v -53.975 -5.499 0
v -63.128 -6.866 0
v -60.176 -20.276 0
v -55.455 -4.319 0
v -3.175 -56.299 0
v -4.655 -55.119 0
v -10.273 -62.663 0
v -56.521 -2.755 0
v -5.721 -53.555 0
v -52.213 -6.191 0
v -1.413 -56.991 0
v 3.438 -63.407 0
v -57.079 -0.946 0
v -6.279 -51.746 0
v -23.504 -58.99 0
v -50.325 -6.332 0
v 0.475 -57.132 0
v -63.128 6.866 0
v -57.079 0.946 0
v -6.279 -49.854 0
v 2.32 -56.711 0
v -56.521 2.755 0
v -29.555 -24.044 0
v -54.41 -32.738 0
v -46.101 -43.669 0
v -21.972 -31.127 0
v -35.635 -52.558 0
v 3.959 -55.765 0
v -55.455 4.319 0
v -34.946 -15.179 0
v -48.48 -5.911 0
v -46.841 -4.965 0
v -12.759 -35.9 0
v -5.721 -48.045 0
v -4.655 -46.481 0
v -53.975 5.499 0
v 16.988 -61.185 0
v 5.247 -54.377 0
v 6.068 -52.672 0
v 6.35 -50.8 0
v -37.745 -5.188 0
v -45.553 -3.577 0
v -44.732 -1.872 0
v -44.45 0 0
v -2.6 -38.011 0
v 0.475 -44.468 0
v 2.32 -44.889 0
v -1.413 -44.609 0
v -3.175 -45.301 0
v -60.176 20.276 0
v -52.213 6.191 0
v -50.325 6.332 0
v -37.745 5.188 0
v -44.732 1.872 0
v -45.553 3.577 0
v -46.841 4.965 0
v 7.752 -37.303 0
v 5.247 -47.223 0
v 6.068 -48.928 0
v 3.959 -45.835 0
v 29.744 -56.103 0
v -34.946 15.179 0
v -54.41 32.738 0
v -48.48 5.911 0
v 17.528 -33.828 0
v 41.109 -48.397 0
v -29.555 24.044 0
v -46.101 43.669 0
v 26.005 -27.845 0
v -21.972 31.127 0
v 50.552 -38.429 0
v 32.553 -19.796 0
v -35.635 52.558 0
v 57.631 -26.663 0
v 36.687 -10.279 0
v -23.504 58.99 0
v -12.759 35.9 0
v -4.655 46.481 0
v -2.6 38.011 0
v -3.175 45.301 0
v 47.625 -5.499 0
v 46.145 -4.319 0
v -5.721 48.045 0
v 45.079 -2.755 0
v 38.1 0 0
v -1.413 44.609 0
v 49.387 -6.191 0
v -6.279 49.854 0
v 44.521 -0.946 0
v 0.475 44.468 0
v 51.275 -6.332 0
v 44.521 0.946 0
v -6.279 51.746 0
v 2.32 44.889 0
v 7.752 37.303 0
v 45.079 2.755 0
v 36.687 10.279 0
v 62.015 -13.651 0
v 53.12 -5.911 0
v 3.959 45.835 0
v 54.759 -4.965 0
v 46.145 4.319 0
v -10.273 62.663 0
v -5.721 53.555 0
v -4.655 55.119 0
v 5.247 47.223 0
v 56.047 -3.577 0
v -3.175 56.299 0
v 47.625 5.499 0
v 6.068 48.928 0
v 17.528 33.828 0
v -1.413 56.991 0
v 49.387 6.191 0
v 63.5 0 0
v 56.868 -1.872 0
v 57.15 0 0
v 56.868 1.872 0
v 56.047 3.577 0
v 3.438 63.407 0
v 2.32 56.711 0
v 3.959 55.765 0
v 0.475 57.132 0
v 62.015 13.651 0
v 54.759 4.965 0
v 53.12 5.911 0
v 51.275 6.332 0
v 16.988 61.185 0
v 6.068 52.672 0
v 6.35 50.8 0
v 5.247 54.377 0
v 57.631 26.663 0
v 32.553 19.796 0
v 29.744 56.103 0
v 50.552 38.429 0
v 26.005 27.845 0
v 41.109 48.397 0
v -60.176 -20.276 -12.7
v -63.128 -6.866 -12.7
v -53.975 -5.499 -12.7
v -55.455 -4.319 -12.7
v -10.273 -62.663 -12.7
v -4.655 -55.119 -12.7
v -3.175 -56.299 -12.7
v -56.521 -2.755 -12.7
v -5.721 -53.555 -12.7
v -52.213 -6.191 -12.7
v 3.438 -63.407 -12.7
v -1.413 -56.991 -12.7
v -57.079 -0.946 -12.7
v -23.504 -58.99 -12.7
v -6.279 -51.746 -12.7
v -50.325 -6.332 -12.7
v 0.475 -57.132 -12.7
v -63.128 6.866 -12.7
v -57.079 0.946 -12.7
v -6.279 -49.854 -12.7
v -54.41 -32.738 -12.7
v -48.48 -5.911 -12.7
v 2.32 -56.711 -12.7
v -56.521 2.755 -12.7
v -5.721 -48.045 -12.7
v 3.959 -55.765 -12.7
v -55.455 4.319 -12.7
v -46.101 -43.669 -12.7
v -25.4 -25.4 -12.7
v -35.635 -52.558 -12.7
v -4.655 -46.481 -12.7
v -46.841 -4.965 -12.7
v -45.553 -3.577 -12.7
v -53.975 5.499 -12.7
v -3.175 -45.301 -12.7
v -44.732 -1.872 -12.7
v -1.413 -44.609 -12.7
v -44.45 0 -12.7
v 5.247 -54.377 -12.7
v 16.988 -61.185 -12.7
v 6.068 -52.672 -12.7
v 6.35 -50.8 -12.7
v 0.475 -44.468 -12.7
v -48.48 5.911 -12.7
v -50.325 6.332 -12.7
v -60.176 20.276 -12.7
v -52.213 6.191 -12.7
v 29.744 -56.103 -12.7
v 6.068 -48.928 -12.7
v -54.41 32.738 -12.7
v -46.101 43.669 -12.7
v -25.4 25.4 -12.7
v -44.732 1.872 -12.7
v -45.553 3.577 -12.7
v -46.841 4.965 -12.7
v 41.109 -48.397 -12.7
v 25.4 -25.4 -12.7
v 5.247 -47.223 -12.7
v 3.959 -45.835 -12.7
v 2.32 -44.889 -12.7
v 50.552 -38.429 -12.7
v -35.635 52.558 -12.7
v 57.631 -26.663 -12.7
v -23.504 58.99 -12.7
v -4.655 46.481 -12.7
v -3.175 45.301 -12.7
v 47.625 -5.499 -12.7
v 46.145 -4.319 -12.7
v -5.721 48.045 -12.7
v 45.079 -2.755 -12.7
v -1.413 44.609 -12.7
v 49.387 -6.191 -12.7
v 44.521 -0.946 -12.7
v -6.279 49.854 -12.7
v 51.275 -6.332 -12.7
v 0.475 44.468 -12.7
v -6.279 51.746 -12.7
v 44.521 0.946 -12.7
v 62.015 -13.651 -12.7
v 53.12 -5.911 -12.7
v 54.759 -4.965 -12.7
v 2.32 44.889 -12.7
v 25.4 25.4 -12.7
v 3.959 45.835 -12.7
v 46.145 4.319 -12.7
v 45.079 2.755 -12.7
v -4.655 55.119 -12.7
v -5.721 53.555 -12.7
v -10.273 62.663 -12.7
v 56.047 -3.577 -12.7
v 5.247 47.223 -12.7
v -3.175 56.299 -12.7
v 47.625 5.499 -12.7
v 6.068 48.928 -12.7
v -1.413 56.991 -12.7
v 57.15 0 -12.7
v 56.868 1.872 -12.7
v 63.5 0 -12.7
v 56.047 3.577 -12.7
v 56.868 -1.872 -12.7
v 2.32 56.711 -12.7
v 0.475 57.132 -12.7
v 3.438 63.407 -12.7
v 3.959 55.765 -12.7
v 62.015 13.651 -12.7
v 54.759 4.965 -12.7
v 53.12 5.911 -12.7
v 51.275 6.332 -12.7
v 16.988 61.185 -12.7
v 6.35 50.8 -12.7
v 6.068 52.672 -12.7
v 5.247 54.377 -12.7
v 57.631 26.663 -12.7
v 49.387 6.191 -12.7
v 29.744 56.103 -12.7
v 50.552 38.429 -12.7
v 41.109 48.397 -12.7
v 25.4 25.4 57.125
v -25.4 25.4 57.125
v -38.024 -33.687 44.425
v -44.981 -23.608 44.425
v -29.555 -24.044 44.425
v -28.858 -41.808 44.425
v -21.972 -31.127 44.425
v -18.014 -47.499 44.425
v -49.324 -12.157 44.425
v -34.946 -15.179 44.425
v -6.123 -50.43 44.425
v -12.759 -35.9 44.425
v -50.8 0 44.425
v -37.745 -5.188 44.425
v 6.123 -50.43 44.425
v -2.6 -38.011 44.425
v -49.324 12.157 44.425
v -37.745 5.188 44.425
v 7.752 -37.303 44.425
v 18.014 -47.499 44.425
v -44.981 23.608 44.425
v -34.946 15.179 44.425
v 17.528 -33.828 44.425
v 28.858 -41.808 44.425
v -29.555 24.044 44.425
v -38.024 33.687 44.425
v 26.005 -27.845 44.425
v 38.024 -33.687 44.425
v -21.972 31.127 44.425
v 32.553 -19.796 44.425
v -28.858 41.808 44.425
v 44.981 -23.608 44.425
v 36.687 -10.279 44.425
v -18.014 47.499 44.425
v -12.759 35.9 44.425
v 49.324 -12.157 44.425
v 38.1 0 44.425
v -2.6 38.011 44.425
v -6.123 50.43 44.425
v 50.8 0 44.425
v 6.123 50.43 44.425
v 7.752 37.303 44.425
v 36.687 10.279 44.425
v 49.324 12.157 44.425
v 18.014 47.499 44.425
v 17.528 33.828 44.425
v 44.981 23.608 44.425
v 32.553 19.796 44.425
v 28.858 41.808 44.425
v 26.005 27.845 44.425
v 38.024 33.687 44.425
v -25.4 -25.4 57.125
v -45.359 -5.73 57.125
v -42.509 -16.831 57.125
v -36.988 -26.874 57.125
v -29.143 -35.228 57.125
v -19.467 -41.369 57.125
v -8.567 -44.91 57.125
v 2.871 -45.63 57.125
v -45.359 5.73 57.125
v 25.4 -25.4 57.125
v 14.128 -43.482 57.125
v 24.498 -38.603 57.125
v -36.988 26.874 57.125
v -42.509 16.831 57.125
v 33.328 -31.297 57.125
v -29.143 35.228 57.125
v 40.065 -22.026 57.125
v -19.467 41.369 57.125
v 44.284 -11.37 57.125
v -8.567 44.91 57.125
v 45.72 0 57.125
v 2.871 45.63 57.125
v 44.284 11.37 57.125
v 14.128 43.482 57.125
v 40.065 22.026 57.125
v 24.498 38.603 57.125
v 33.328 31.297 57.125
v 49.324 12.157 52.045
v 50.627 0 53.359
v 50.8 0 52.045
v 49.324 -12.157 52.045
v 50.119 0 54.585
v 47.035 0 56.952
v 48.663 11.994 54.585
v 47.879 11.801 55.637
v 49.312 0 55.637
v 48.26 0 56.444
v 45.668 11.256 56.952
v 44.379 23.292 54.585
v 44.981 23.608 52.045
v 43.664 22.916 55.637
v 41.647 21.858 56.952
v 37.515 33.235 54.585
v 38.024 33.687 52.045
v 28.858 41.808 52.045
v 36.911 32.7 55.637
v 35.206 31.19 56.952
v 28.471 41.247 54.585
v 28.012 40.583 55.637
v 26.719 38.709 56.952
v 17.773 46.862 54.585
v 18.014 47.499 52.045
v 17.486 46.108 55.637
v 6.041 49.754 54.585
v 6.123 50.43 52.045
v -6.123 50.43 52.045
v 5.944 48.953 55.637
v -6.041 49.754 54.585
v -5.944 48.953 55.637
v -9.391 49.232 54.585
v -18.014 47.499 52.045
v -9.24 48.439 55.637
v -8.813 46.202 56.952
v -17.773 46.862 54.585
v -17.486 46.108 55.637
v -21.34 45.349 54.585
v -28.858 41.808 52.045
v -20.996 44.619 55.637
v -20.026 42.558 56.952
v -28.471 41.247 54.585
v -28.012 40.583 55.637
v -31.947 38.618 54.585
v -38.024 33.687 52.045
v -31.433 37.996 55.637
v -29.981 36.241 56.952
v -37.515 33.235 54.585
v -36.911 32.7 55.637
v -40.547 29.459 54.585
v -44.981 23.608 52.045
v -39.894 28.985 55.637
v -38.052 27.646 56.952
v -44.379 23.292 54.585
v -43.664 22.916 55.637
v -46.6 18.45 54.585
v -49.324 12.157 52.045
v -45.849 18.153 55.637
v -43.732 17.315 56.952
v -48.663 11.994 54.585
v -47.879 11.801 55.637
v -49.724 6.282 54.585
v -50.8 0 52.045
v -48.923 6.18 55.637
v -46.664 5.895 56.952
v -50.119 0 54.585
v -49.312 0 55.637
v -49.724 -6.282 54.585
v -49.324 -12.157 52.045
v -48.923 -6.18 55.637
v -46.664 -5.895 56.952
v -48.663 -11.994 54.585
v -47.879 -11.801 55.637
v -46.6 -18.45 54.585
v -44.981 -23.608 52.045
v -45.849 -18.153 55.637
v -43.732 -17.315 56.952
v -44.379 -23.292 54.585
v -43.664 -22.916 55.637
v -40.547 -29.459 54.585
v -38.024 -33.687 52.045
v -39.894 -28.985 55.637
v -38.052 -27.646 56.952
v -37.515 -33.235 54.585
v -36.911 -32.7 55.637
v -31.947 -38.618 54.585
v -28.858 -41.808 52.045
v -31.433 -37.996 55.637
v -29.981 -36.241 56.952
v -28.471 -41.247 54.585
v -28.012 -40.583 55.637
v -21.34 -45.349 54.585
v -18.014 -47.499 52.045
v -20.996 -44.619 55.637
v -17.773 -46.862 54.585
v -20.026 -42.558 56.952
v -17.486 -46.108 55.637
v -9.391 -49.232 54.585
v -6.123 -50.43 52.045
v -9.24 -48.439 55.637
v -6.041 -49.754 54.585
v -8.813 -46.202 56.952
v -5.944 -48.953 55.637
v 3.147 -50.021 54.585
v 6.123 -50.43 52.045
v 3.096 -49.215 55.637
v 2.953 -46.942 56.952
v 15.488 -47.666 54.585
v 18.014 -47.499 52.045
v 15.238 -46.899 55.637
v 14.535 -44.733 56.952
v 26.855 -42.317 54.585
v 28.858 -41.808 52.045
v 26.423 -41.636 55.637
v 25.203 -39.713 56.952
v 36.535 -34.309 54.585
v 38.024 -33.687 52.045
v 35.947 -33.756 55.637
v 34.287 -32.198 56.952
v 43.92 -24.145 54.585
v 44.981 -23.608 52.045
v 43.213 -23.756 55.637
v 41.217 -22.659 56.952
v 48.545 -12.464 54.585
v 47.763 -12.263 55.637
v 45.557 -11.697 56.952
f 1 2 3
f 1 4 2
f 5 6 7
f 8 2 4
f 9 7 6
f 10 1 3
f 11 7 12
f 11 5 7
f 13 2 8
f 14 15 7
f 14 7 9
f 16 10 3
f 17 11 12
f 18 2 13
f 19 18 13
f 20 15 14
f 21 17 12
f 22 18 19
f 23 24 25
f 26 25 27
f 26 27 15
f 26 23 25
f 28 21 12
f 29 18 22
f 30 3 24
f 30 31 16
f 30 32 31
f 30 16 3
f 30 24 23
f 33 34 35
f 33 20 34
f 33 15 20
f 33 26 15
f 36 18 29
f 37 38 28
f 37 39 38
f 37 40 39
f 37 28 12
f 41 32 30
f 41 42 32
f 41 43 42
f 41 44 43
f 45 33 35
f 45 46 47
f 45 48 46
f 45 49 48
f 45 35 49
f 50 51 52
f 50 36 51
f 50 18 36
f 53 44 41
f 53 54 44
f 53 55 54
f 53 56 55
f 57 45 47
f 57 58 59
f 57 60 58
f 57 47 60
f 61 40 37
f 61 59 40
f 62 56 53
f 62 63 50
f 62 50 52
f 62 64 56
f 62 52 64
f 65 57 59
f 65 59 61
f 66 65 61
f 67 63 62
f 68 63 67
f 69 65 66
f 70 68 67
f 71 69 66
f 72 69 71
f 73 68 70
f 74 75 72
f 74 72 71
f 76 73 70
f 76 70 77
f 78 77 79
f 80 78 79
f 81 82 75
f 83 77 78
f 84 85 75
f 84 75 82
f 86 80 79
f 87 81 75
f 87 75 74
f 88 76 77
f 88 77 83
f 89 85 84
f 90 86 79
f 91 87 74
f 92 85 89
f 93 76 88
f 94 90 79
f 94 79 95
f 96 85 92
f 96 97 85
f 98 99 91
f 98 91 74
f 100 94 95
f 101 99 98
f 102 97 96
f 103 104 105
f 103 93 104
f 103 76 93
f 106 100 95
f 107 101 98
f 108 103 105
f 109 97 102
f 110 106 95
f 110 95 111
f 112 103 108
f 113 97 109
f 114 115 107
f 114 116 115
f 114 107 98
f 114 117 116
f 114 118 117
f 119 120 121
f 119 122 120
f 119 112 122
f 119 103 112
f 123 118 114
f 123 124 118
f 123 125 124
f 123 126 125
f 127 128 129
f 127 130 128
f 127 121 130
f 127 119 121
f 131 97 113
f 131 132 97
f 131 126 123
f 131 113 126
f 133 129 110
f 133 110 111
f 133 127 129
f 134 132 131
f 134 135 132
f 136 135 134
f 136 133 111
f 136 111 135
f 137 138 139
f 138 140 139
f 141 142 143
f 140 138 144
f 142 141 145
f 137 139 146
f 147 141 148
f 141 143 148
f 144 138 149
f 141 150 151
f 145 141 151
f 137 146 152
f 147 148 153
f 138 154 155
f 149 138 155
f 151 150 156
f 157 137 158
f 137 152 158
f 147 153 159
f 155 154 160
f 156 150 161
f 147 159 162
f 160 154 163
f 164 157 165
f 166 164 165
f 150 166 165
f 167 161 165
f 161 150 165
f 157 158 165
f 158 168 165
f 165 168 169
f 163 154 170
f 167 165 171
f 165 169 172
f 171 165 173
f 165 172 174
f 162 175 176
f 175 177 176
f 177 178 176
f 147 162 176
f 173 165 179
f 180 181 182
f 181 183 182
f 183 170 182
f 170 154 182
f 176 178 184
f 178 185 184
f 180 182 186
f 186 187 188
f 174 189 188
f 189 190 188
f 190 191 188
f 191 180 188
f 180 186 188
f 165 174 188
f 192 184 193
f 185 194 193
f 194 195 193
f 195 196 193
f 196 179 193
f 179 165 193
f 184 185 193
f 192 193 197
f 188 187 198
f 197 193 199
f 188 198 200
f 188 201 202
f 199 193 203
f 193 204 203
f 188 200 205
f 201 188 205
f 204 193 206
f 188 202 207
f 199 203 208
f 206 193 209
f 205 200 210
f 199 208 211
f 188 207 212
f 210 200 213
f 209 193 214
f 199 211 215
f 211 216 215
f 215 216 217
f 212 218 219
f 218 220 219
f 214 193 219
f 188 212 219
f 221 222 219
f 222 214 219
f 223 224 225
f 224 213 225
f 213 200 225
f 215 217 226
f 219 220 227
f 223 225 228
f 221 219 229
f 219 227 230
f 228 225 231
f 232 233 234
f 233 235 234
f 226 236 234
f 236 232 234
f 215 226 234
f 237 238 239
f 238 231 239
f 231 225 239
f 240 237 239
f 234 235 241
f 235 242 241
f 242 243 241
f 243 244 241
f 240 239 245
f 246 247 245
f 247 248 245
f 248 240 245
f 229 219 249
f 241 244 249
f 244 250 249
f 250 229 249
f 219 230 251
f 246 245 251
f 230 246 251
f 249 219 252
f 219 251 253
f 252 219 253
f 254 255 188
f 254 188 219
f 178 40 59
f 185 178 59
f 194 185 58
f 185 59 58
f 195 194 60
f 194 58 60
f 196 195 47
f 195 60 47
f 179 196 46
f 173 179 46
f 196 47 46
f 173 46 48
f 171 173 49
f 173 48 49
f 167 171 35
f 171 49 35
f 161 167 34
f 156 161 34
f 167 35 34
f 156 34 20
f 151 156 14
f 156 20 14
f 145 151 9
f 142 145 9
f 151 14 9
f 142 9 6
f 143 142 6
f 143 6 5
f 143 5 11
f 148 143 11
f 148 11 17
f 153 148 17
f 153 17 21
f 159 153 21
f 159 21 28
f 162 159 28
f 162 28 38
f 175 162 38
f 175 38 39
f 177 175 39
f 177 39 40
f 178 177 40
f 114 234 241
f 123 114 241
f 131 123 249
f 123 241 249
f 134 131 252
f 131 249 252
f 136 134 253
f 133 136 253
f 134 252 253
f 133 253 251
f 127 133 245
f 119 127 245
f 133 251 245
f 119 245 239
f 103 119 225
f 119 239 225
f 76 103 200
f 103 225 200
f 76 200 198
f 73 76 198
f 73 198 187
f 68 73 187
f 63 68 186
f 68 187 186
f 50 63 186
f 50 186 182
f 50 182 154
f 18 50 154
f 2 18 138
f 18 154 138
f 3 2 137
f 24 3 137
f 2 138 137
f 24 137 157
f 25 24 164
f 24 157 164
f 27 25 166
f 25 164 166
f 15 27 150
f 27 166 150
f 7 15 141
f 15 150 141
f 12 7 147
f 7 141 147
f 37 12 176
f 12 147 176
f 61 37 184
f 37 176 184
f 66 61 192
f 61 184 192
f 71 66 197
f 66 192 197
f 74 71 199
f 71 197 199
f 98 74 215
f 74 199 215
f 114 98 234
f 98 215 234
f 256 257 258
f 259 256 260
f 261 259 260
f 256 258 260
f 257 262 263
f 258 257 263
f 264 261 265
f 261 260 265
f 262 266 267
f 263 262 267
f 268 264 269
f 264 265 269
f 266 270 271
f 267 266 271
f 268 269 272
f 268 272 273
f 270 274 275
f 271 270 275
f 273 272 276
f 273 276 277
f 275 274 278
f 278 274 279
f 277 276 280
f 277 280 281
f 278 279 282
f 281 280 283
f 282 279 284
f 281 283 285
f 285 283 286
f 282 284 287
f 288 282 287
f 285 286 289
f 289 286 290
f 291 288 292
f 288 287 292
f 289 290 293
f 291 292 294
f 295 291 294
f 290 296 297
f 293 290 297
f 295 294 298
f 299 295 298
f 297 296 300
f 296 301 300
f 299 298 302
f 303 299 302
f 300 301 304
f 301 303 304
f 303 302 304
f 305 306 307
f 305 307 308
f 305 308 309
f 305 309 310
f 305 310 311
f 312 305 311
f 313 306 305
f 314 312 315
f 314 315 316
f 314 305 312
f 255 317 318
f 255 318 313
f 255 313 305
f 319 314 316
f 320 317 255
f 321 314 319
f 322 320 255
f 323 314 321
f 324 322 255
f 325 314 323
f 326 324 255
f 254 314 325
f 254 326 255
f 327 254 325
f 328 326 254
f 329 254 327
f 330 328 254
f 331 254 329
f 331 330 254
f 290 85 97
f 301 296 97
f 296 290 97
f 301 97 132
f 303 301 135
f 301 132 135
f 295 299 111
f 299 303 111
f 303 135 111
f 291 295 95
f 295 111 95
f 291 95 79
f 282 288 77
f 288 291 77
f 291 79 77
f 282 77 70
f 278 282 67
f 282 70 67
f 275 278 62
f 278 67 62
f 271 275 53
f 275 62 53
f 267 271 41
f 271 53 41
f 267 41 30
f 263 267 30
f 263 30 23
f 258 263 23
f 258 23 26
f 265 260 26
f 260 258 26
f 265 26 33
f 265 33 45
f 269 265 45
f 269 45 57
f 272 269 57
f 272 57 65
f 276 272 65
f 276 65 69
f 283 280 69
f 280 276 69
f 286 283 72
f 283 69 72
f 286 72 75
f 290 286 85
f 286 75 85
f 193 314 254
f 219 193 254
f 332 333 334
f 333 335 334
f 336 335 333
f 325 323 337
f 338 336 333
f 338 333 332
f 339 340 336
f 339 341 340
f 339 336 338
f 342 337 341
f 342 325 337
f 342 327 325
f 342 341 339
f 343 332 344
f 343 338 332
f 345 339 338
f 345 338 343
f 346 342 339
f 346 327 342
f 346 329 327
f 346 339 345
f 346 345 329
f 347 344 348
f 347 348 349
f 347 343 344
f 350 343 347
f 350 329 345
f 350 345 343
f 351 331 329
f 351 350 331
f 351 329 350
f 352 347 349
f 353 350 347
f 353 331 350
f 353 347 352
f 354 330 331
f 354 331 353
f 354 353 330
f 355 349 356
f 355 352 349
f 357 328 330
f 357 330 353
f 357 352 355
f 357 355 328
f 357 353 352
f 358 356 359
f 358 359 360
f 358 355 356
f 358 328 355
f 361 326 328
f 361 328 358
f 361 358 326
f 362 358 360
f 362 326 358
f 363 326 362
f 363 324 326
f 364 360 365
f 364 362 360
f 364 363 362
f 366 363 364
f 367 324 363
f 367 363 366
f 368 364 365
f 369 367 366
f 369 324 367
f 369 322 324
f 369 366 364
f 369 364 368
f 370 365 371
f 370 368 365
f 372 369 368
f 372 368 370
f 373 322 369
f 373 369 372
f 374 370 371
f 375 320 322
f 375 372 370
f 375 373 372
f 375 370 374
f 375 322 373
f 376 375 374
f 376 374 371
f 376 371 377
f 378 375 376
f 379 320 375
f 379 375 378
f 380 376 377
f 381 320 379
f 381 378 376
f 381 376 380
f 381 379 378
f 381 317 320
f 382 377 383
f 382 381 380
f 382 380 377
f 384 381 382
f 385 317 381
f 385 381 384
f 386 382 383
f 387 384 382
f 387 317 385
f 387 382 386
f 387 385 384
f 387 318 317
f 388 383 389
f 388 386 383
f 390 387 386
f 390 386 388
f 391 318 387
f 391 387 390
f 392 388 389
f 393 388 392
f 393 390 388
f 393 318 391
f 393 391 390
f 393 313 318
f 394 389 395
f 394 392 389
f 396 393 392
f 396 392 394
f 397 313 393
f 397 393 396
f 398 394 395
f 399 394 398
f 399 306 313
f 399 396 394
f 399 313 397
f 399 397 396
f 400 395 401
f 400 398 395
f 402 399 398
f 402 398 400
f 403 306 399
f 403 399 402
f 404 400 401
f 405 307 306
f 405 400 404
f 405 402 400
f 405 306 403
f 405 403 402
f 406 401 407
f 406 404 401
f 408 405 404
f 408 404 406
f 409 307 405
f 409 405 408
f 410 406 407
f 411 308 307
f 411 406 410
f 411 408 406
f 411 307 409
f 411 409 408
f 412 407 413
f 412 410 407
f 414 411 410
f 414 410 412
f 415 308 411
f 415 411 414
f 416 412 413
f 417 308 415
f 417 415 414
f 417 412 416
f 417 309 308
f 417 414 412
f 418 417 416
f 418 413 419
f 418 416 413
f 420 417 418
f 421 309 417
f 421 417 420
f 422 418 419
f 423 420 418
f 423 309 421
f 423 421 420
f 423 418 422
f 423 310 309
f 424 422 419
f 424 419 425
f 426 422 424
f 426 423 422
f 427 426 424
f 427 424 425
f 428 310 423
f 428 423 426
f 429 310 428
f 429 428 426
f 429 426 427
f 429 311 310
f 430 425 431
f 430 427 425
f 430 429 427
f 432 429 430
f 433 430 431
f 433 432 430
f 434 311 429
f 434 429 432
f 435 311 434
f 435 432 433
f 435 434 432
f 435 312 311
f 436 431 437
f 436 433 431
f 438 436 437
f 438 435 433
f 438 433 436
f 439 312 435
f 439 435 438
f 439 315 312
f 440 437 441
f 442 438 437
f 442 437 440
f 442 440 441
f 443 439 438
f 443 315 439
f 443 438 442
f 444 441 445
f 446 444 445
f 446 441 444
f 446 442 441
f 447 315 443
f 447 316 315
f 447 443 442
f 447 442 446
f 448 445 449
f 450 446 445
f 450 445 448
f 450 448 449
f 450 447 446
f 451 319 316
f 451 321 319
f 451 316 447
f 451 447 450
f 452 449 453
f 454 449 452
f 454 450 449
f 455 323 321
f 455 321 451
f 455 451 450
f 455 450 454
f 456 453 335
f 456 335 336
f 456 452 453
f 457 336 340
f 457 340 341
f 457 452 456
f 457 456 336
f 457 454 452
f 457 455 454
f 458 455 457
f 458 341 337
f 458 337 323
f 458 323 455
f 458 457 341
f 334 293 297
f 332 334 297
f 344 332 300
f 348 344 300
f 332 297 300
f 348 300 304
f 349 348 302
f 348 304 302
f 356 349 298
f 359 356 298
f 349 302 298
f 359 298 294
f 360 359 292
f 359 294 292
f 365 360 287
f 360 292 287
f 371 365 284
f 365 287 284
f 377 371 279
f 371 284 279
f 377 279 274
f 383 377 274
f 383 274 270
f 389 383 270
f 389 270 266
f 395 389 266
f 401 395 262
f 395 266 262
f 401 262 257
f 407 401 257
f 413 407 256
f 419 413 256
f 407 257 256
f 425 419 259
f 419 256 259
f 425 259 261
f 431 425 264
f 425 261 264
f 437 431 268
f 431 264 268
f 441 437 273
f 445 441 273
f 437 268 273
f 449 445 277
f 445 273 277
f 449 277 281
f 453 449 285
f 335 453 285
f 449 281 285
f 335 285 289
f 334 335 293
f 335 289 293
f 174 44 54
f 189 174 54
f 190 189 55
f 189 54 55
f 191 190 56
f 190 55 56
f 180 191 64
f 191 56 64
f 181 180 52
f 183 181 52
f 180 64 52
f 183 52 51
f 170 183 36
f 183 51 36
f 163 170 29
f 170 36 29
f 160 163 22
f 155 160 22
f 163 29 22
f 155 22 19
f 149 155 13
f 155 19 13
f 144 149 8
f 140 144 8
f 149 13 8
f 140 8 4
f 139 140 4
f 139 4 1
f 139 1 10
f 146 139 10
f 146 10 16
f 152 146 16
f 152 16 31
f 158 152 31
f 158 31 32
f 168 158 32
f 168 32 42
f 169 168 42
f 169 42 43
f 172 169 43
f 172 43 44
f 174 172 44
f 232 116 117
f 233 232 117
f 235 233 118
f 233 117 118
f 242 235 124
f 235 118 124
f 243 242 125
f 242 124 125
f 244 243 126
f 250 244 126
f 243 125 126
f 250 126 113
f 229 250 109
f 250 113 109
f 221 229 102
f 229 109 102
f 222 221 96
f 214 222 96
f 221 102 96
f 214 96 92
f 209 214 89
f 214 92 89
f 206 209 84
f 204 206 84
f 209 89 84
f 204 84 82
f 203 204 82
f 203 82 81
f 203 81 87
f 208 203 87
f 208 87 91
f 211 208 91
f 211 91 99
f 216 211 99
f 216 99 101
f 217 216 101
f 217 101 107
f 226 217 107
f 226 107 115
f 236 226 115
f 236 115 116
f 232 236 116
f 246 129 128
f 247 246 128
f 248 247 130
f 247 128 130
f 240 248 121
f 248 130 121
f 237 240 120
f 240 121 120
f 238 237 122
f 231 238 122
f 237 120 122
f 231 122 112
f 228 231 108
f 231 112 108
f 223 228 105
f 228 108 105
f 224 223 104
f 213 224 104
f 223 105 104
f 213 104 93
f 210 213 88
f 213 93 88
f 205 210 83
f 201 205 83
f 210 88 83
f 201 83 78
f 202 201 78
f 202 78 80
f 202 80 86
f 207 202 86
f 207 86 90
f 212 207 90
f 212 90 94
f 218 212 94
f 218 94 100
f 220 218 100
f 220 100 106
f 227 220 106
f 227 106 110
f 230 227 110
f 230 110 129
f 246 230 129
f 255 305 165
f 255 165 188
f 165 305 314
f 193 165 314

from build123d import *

# Parameters (mm, degrees)
F0_R      = 63.5
F1_DEPTH  = 12.7
F2_R      = 38.1
F3_DEPTH  = 57.15
F5_R      = 50.8
F6_DEPTH  = 12.7
F8_W      = 50.8
F8_H      = 50.8
F9_DEPTH  = 82.55
F10_R     = 5.08
F12_R     = 6.35
F13_DEPTH = 25.4


with BuildPart() as f1:
    # F0 (on Top) → F1 (new body)
    with BuildSketch(Plane.XY):
        Circle(F0_R)
    extrude(amount=F1_DEPTH)

    # F2 (on Top) → F3 (join)
    with BuildSketch(Plane.XY):
        Circle(F2_R)
    extrude(amount=F3_DEPTH)


with BuildPart() as f1_1:
    # F4: moved
    add(f1.part.moved(Location((0, 0, -57.1246))))

    # F5 (on Top) → F6 (join)
    with BuildSketch(Plane.XY):
        Circle(F5_R)
    extrude(amount=F6_DEPTH)


with BuildPart() as f1_2:
    # F7: moved
    add(f1_1.part.moved(Location((0, 0, -12.7))))

    # F8 (on Top) → F9 (cut)
    with BuildSketch(Plane.XY):
        Rectangle(F8_W, F8_H)
    extrude(amount=-F9_DEPTH, mode=Mode.SUBTRACT)

    # F10
    f10_edges = [f1_2.edges().sort_by_distance(p)[0] for p in [
        (-50.8, 0, 0),
    ]]
    fillet(f10_edges, radius=F10_R)


with BuildPart() as f1_3:
    # F11: moved
    add(f1_2.part.moved(Location((0, 0, 57.1246))))

    # F12 (on Top) → F13 (cut)
    with BuildSketch(Plane.XY):
        with Locations((0, -50.8)):
            Circle(F12_R)
        with Locations((50.8, 0)):
            Circle(F12_R)
        with Locations((0, 50.8)):
            Circle(F12_R)
        with Locations((-50.8, 0)):
            Circle(F12_R)
    extrude(amount=-F13_DEPTH, mode=Mode.SUBTRACT)


solid = f1_3.part
